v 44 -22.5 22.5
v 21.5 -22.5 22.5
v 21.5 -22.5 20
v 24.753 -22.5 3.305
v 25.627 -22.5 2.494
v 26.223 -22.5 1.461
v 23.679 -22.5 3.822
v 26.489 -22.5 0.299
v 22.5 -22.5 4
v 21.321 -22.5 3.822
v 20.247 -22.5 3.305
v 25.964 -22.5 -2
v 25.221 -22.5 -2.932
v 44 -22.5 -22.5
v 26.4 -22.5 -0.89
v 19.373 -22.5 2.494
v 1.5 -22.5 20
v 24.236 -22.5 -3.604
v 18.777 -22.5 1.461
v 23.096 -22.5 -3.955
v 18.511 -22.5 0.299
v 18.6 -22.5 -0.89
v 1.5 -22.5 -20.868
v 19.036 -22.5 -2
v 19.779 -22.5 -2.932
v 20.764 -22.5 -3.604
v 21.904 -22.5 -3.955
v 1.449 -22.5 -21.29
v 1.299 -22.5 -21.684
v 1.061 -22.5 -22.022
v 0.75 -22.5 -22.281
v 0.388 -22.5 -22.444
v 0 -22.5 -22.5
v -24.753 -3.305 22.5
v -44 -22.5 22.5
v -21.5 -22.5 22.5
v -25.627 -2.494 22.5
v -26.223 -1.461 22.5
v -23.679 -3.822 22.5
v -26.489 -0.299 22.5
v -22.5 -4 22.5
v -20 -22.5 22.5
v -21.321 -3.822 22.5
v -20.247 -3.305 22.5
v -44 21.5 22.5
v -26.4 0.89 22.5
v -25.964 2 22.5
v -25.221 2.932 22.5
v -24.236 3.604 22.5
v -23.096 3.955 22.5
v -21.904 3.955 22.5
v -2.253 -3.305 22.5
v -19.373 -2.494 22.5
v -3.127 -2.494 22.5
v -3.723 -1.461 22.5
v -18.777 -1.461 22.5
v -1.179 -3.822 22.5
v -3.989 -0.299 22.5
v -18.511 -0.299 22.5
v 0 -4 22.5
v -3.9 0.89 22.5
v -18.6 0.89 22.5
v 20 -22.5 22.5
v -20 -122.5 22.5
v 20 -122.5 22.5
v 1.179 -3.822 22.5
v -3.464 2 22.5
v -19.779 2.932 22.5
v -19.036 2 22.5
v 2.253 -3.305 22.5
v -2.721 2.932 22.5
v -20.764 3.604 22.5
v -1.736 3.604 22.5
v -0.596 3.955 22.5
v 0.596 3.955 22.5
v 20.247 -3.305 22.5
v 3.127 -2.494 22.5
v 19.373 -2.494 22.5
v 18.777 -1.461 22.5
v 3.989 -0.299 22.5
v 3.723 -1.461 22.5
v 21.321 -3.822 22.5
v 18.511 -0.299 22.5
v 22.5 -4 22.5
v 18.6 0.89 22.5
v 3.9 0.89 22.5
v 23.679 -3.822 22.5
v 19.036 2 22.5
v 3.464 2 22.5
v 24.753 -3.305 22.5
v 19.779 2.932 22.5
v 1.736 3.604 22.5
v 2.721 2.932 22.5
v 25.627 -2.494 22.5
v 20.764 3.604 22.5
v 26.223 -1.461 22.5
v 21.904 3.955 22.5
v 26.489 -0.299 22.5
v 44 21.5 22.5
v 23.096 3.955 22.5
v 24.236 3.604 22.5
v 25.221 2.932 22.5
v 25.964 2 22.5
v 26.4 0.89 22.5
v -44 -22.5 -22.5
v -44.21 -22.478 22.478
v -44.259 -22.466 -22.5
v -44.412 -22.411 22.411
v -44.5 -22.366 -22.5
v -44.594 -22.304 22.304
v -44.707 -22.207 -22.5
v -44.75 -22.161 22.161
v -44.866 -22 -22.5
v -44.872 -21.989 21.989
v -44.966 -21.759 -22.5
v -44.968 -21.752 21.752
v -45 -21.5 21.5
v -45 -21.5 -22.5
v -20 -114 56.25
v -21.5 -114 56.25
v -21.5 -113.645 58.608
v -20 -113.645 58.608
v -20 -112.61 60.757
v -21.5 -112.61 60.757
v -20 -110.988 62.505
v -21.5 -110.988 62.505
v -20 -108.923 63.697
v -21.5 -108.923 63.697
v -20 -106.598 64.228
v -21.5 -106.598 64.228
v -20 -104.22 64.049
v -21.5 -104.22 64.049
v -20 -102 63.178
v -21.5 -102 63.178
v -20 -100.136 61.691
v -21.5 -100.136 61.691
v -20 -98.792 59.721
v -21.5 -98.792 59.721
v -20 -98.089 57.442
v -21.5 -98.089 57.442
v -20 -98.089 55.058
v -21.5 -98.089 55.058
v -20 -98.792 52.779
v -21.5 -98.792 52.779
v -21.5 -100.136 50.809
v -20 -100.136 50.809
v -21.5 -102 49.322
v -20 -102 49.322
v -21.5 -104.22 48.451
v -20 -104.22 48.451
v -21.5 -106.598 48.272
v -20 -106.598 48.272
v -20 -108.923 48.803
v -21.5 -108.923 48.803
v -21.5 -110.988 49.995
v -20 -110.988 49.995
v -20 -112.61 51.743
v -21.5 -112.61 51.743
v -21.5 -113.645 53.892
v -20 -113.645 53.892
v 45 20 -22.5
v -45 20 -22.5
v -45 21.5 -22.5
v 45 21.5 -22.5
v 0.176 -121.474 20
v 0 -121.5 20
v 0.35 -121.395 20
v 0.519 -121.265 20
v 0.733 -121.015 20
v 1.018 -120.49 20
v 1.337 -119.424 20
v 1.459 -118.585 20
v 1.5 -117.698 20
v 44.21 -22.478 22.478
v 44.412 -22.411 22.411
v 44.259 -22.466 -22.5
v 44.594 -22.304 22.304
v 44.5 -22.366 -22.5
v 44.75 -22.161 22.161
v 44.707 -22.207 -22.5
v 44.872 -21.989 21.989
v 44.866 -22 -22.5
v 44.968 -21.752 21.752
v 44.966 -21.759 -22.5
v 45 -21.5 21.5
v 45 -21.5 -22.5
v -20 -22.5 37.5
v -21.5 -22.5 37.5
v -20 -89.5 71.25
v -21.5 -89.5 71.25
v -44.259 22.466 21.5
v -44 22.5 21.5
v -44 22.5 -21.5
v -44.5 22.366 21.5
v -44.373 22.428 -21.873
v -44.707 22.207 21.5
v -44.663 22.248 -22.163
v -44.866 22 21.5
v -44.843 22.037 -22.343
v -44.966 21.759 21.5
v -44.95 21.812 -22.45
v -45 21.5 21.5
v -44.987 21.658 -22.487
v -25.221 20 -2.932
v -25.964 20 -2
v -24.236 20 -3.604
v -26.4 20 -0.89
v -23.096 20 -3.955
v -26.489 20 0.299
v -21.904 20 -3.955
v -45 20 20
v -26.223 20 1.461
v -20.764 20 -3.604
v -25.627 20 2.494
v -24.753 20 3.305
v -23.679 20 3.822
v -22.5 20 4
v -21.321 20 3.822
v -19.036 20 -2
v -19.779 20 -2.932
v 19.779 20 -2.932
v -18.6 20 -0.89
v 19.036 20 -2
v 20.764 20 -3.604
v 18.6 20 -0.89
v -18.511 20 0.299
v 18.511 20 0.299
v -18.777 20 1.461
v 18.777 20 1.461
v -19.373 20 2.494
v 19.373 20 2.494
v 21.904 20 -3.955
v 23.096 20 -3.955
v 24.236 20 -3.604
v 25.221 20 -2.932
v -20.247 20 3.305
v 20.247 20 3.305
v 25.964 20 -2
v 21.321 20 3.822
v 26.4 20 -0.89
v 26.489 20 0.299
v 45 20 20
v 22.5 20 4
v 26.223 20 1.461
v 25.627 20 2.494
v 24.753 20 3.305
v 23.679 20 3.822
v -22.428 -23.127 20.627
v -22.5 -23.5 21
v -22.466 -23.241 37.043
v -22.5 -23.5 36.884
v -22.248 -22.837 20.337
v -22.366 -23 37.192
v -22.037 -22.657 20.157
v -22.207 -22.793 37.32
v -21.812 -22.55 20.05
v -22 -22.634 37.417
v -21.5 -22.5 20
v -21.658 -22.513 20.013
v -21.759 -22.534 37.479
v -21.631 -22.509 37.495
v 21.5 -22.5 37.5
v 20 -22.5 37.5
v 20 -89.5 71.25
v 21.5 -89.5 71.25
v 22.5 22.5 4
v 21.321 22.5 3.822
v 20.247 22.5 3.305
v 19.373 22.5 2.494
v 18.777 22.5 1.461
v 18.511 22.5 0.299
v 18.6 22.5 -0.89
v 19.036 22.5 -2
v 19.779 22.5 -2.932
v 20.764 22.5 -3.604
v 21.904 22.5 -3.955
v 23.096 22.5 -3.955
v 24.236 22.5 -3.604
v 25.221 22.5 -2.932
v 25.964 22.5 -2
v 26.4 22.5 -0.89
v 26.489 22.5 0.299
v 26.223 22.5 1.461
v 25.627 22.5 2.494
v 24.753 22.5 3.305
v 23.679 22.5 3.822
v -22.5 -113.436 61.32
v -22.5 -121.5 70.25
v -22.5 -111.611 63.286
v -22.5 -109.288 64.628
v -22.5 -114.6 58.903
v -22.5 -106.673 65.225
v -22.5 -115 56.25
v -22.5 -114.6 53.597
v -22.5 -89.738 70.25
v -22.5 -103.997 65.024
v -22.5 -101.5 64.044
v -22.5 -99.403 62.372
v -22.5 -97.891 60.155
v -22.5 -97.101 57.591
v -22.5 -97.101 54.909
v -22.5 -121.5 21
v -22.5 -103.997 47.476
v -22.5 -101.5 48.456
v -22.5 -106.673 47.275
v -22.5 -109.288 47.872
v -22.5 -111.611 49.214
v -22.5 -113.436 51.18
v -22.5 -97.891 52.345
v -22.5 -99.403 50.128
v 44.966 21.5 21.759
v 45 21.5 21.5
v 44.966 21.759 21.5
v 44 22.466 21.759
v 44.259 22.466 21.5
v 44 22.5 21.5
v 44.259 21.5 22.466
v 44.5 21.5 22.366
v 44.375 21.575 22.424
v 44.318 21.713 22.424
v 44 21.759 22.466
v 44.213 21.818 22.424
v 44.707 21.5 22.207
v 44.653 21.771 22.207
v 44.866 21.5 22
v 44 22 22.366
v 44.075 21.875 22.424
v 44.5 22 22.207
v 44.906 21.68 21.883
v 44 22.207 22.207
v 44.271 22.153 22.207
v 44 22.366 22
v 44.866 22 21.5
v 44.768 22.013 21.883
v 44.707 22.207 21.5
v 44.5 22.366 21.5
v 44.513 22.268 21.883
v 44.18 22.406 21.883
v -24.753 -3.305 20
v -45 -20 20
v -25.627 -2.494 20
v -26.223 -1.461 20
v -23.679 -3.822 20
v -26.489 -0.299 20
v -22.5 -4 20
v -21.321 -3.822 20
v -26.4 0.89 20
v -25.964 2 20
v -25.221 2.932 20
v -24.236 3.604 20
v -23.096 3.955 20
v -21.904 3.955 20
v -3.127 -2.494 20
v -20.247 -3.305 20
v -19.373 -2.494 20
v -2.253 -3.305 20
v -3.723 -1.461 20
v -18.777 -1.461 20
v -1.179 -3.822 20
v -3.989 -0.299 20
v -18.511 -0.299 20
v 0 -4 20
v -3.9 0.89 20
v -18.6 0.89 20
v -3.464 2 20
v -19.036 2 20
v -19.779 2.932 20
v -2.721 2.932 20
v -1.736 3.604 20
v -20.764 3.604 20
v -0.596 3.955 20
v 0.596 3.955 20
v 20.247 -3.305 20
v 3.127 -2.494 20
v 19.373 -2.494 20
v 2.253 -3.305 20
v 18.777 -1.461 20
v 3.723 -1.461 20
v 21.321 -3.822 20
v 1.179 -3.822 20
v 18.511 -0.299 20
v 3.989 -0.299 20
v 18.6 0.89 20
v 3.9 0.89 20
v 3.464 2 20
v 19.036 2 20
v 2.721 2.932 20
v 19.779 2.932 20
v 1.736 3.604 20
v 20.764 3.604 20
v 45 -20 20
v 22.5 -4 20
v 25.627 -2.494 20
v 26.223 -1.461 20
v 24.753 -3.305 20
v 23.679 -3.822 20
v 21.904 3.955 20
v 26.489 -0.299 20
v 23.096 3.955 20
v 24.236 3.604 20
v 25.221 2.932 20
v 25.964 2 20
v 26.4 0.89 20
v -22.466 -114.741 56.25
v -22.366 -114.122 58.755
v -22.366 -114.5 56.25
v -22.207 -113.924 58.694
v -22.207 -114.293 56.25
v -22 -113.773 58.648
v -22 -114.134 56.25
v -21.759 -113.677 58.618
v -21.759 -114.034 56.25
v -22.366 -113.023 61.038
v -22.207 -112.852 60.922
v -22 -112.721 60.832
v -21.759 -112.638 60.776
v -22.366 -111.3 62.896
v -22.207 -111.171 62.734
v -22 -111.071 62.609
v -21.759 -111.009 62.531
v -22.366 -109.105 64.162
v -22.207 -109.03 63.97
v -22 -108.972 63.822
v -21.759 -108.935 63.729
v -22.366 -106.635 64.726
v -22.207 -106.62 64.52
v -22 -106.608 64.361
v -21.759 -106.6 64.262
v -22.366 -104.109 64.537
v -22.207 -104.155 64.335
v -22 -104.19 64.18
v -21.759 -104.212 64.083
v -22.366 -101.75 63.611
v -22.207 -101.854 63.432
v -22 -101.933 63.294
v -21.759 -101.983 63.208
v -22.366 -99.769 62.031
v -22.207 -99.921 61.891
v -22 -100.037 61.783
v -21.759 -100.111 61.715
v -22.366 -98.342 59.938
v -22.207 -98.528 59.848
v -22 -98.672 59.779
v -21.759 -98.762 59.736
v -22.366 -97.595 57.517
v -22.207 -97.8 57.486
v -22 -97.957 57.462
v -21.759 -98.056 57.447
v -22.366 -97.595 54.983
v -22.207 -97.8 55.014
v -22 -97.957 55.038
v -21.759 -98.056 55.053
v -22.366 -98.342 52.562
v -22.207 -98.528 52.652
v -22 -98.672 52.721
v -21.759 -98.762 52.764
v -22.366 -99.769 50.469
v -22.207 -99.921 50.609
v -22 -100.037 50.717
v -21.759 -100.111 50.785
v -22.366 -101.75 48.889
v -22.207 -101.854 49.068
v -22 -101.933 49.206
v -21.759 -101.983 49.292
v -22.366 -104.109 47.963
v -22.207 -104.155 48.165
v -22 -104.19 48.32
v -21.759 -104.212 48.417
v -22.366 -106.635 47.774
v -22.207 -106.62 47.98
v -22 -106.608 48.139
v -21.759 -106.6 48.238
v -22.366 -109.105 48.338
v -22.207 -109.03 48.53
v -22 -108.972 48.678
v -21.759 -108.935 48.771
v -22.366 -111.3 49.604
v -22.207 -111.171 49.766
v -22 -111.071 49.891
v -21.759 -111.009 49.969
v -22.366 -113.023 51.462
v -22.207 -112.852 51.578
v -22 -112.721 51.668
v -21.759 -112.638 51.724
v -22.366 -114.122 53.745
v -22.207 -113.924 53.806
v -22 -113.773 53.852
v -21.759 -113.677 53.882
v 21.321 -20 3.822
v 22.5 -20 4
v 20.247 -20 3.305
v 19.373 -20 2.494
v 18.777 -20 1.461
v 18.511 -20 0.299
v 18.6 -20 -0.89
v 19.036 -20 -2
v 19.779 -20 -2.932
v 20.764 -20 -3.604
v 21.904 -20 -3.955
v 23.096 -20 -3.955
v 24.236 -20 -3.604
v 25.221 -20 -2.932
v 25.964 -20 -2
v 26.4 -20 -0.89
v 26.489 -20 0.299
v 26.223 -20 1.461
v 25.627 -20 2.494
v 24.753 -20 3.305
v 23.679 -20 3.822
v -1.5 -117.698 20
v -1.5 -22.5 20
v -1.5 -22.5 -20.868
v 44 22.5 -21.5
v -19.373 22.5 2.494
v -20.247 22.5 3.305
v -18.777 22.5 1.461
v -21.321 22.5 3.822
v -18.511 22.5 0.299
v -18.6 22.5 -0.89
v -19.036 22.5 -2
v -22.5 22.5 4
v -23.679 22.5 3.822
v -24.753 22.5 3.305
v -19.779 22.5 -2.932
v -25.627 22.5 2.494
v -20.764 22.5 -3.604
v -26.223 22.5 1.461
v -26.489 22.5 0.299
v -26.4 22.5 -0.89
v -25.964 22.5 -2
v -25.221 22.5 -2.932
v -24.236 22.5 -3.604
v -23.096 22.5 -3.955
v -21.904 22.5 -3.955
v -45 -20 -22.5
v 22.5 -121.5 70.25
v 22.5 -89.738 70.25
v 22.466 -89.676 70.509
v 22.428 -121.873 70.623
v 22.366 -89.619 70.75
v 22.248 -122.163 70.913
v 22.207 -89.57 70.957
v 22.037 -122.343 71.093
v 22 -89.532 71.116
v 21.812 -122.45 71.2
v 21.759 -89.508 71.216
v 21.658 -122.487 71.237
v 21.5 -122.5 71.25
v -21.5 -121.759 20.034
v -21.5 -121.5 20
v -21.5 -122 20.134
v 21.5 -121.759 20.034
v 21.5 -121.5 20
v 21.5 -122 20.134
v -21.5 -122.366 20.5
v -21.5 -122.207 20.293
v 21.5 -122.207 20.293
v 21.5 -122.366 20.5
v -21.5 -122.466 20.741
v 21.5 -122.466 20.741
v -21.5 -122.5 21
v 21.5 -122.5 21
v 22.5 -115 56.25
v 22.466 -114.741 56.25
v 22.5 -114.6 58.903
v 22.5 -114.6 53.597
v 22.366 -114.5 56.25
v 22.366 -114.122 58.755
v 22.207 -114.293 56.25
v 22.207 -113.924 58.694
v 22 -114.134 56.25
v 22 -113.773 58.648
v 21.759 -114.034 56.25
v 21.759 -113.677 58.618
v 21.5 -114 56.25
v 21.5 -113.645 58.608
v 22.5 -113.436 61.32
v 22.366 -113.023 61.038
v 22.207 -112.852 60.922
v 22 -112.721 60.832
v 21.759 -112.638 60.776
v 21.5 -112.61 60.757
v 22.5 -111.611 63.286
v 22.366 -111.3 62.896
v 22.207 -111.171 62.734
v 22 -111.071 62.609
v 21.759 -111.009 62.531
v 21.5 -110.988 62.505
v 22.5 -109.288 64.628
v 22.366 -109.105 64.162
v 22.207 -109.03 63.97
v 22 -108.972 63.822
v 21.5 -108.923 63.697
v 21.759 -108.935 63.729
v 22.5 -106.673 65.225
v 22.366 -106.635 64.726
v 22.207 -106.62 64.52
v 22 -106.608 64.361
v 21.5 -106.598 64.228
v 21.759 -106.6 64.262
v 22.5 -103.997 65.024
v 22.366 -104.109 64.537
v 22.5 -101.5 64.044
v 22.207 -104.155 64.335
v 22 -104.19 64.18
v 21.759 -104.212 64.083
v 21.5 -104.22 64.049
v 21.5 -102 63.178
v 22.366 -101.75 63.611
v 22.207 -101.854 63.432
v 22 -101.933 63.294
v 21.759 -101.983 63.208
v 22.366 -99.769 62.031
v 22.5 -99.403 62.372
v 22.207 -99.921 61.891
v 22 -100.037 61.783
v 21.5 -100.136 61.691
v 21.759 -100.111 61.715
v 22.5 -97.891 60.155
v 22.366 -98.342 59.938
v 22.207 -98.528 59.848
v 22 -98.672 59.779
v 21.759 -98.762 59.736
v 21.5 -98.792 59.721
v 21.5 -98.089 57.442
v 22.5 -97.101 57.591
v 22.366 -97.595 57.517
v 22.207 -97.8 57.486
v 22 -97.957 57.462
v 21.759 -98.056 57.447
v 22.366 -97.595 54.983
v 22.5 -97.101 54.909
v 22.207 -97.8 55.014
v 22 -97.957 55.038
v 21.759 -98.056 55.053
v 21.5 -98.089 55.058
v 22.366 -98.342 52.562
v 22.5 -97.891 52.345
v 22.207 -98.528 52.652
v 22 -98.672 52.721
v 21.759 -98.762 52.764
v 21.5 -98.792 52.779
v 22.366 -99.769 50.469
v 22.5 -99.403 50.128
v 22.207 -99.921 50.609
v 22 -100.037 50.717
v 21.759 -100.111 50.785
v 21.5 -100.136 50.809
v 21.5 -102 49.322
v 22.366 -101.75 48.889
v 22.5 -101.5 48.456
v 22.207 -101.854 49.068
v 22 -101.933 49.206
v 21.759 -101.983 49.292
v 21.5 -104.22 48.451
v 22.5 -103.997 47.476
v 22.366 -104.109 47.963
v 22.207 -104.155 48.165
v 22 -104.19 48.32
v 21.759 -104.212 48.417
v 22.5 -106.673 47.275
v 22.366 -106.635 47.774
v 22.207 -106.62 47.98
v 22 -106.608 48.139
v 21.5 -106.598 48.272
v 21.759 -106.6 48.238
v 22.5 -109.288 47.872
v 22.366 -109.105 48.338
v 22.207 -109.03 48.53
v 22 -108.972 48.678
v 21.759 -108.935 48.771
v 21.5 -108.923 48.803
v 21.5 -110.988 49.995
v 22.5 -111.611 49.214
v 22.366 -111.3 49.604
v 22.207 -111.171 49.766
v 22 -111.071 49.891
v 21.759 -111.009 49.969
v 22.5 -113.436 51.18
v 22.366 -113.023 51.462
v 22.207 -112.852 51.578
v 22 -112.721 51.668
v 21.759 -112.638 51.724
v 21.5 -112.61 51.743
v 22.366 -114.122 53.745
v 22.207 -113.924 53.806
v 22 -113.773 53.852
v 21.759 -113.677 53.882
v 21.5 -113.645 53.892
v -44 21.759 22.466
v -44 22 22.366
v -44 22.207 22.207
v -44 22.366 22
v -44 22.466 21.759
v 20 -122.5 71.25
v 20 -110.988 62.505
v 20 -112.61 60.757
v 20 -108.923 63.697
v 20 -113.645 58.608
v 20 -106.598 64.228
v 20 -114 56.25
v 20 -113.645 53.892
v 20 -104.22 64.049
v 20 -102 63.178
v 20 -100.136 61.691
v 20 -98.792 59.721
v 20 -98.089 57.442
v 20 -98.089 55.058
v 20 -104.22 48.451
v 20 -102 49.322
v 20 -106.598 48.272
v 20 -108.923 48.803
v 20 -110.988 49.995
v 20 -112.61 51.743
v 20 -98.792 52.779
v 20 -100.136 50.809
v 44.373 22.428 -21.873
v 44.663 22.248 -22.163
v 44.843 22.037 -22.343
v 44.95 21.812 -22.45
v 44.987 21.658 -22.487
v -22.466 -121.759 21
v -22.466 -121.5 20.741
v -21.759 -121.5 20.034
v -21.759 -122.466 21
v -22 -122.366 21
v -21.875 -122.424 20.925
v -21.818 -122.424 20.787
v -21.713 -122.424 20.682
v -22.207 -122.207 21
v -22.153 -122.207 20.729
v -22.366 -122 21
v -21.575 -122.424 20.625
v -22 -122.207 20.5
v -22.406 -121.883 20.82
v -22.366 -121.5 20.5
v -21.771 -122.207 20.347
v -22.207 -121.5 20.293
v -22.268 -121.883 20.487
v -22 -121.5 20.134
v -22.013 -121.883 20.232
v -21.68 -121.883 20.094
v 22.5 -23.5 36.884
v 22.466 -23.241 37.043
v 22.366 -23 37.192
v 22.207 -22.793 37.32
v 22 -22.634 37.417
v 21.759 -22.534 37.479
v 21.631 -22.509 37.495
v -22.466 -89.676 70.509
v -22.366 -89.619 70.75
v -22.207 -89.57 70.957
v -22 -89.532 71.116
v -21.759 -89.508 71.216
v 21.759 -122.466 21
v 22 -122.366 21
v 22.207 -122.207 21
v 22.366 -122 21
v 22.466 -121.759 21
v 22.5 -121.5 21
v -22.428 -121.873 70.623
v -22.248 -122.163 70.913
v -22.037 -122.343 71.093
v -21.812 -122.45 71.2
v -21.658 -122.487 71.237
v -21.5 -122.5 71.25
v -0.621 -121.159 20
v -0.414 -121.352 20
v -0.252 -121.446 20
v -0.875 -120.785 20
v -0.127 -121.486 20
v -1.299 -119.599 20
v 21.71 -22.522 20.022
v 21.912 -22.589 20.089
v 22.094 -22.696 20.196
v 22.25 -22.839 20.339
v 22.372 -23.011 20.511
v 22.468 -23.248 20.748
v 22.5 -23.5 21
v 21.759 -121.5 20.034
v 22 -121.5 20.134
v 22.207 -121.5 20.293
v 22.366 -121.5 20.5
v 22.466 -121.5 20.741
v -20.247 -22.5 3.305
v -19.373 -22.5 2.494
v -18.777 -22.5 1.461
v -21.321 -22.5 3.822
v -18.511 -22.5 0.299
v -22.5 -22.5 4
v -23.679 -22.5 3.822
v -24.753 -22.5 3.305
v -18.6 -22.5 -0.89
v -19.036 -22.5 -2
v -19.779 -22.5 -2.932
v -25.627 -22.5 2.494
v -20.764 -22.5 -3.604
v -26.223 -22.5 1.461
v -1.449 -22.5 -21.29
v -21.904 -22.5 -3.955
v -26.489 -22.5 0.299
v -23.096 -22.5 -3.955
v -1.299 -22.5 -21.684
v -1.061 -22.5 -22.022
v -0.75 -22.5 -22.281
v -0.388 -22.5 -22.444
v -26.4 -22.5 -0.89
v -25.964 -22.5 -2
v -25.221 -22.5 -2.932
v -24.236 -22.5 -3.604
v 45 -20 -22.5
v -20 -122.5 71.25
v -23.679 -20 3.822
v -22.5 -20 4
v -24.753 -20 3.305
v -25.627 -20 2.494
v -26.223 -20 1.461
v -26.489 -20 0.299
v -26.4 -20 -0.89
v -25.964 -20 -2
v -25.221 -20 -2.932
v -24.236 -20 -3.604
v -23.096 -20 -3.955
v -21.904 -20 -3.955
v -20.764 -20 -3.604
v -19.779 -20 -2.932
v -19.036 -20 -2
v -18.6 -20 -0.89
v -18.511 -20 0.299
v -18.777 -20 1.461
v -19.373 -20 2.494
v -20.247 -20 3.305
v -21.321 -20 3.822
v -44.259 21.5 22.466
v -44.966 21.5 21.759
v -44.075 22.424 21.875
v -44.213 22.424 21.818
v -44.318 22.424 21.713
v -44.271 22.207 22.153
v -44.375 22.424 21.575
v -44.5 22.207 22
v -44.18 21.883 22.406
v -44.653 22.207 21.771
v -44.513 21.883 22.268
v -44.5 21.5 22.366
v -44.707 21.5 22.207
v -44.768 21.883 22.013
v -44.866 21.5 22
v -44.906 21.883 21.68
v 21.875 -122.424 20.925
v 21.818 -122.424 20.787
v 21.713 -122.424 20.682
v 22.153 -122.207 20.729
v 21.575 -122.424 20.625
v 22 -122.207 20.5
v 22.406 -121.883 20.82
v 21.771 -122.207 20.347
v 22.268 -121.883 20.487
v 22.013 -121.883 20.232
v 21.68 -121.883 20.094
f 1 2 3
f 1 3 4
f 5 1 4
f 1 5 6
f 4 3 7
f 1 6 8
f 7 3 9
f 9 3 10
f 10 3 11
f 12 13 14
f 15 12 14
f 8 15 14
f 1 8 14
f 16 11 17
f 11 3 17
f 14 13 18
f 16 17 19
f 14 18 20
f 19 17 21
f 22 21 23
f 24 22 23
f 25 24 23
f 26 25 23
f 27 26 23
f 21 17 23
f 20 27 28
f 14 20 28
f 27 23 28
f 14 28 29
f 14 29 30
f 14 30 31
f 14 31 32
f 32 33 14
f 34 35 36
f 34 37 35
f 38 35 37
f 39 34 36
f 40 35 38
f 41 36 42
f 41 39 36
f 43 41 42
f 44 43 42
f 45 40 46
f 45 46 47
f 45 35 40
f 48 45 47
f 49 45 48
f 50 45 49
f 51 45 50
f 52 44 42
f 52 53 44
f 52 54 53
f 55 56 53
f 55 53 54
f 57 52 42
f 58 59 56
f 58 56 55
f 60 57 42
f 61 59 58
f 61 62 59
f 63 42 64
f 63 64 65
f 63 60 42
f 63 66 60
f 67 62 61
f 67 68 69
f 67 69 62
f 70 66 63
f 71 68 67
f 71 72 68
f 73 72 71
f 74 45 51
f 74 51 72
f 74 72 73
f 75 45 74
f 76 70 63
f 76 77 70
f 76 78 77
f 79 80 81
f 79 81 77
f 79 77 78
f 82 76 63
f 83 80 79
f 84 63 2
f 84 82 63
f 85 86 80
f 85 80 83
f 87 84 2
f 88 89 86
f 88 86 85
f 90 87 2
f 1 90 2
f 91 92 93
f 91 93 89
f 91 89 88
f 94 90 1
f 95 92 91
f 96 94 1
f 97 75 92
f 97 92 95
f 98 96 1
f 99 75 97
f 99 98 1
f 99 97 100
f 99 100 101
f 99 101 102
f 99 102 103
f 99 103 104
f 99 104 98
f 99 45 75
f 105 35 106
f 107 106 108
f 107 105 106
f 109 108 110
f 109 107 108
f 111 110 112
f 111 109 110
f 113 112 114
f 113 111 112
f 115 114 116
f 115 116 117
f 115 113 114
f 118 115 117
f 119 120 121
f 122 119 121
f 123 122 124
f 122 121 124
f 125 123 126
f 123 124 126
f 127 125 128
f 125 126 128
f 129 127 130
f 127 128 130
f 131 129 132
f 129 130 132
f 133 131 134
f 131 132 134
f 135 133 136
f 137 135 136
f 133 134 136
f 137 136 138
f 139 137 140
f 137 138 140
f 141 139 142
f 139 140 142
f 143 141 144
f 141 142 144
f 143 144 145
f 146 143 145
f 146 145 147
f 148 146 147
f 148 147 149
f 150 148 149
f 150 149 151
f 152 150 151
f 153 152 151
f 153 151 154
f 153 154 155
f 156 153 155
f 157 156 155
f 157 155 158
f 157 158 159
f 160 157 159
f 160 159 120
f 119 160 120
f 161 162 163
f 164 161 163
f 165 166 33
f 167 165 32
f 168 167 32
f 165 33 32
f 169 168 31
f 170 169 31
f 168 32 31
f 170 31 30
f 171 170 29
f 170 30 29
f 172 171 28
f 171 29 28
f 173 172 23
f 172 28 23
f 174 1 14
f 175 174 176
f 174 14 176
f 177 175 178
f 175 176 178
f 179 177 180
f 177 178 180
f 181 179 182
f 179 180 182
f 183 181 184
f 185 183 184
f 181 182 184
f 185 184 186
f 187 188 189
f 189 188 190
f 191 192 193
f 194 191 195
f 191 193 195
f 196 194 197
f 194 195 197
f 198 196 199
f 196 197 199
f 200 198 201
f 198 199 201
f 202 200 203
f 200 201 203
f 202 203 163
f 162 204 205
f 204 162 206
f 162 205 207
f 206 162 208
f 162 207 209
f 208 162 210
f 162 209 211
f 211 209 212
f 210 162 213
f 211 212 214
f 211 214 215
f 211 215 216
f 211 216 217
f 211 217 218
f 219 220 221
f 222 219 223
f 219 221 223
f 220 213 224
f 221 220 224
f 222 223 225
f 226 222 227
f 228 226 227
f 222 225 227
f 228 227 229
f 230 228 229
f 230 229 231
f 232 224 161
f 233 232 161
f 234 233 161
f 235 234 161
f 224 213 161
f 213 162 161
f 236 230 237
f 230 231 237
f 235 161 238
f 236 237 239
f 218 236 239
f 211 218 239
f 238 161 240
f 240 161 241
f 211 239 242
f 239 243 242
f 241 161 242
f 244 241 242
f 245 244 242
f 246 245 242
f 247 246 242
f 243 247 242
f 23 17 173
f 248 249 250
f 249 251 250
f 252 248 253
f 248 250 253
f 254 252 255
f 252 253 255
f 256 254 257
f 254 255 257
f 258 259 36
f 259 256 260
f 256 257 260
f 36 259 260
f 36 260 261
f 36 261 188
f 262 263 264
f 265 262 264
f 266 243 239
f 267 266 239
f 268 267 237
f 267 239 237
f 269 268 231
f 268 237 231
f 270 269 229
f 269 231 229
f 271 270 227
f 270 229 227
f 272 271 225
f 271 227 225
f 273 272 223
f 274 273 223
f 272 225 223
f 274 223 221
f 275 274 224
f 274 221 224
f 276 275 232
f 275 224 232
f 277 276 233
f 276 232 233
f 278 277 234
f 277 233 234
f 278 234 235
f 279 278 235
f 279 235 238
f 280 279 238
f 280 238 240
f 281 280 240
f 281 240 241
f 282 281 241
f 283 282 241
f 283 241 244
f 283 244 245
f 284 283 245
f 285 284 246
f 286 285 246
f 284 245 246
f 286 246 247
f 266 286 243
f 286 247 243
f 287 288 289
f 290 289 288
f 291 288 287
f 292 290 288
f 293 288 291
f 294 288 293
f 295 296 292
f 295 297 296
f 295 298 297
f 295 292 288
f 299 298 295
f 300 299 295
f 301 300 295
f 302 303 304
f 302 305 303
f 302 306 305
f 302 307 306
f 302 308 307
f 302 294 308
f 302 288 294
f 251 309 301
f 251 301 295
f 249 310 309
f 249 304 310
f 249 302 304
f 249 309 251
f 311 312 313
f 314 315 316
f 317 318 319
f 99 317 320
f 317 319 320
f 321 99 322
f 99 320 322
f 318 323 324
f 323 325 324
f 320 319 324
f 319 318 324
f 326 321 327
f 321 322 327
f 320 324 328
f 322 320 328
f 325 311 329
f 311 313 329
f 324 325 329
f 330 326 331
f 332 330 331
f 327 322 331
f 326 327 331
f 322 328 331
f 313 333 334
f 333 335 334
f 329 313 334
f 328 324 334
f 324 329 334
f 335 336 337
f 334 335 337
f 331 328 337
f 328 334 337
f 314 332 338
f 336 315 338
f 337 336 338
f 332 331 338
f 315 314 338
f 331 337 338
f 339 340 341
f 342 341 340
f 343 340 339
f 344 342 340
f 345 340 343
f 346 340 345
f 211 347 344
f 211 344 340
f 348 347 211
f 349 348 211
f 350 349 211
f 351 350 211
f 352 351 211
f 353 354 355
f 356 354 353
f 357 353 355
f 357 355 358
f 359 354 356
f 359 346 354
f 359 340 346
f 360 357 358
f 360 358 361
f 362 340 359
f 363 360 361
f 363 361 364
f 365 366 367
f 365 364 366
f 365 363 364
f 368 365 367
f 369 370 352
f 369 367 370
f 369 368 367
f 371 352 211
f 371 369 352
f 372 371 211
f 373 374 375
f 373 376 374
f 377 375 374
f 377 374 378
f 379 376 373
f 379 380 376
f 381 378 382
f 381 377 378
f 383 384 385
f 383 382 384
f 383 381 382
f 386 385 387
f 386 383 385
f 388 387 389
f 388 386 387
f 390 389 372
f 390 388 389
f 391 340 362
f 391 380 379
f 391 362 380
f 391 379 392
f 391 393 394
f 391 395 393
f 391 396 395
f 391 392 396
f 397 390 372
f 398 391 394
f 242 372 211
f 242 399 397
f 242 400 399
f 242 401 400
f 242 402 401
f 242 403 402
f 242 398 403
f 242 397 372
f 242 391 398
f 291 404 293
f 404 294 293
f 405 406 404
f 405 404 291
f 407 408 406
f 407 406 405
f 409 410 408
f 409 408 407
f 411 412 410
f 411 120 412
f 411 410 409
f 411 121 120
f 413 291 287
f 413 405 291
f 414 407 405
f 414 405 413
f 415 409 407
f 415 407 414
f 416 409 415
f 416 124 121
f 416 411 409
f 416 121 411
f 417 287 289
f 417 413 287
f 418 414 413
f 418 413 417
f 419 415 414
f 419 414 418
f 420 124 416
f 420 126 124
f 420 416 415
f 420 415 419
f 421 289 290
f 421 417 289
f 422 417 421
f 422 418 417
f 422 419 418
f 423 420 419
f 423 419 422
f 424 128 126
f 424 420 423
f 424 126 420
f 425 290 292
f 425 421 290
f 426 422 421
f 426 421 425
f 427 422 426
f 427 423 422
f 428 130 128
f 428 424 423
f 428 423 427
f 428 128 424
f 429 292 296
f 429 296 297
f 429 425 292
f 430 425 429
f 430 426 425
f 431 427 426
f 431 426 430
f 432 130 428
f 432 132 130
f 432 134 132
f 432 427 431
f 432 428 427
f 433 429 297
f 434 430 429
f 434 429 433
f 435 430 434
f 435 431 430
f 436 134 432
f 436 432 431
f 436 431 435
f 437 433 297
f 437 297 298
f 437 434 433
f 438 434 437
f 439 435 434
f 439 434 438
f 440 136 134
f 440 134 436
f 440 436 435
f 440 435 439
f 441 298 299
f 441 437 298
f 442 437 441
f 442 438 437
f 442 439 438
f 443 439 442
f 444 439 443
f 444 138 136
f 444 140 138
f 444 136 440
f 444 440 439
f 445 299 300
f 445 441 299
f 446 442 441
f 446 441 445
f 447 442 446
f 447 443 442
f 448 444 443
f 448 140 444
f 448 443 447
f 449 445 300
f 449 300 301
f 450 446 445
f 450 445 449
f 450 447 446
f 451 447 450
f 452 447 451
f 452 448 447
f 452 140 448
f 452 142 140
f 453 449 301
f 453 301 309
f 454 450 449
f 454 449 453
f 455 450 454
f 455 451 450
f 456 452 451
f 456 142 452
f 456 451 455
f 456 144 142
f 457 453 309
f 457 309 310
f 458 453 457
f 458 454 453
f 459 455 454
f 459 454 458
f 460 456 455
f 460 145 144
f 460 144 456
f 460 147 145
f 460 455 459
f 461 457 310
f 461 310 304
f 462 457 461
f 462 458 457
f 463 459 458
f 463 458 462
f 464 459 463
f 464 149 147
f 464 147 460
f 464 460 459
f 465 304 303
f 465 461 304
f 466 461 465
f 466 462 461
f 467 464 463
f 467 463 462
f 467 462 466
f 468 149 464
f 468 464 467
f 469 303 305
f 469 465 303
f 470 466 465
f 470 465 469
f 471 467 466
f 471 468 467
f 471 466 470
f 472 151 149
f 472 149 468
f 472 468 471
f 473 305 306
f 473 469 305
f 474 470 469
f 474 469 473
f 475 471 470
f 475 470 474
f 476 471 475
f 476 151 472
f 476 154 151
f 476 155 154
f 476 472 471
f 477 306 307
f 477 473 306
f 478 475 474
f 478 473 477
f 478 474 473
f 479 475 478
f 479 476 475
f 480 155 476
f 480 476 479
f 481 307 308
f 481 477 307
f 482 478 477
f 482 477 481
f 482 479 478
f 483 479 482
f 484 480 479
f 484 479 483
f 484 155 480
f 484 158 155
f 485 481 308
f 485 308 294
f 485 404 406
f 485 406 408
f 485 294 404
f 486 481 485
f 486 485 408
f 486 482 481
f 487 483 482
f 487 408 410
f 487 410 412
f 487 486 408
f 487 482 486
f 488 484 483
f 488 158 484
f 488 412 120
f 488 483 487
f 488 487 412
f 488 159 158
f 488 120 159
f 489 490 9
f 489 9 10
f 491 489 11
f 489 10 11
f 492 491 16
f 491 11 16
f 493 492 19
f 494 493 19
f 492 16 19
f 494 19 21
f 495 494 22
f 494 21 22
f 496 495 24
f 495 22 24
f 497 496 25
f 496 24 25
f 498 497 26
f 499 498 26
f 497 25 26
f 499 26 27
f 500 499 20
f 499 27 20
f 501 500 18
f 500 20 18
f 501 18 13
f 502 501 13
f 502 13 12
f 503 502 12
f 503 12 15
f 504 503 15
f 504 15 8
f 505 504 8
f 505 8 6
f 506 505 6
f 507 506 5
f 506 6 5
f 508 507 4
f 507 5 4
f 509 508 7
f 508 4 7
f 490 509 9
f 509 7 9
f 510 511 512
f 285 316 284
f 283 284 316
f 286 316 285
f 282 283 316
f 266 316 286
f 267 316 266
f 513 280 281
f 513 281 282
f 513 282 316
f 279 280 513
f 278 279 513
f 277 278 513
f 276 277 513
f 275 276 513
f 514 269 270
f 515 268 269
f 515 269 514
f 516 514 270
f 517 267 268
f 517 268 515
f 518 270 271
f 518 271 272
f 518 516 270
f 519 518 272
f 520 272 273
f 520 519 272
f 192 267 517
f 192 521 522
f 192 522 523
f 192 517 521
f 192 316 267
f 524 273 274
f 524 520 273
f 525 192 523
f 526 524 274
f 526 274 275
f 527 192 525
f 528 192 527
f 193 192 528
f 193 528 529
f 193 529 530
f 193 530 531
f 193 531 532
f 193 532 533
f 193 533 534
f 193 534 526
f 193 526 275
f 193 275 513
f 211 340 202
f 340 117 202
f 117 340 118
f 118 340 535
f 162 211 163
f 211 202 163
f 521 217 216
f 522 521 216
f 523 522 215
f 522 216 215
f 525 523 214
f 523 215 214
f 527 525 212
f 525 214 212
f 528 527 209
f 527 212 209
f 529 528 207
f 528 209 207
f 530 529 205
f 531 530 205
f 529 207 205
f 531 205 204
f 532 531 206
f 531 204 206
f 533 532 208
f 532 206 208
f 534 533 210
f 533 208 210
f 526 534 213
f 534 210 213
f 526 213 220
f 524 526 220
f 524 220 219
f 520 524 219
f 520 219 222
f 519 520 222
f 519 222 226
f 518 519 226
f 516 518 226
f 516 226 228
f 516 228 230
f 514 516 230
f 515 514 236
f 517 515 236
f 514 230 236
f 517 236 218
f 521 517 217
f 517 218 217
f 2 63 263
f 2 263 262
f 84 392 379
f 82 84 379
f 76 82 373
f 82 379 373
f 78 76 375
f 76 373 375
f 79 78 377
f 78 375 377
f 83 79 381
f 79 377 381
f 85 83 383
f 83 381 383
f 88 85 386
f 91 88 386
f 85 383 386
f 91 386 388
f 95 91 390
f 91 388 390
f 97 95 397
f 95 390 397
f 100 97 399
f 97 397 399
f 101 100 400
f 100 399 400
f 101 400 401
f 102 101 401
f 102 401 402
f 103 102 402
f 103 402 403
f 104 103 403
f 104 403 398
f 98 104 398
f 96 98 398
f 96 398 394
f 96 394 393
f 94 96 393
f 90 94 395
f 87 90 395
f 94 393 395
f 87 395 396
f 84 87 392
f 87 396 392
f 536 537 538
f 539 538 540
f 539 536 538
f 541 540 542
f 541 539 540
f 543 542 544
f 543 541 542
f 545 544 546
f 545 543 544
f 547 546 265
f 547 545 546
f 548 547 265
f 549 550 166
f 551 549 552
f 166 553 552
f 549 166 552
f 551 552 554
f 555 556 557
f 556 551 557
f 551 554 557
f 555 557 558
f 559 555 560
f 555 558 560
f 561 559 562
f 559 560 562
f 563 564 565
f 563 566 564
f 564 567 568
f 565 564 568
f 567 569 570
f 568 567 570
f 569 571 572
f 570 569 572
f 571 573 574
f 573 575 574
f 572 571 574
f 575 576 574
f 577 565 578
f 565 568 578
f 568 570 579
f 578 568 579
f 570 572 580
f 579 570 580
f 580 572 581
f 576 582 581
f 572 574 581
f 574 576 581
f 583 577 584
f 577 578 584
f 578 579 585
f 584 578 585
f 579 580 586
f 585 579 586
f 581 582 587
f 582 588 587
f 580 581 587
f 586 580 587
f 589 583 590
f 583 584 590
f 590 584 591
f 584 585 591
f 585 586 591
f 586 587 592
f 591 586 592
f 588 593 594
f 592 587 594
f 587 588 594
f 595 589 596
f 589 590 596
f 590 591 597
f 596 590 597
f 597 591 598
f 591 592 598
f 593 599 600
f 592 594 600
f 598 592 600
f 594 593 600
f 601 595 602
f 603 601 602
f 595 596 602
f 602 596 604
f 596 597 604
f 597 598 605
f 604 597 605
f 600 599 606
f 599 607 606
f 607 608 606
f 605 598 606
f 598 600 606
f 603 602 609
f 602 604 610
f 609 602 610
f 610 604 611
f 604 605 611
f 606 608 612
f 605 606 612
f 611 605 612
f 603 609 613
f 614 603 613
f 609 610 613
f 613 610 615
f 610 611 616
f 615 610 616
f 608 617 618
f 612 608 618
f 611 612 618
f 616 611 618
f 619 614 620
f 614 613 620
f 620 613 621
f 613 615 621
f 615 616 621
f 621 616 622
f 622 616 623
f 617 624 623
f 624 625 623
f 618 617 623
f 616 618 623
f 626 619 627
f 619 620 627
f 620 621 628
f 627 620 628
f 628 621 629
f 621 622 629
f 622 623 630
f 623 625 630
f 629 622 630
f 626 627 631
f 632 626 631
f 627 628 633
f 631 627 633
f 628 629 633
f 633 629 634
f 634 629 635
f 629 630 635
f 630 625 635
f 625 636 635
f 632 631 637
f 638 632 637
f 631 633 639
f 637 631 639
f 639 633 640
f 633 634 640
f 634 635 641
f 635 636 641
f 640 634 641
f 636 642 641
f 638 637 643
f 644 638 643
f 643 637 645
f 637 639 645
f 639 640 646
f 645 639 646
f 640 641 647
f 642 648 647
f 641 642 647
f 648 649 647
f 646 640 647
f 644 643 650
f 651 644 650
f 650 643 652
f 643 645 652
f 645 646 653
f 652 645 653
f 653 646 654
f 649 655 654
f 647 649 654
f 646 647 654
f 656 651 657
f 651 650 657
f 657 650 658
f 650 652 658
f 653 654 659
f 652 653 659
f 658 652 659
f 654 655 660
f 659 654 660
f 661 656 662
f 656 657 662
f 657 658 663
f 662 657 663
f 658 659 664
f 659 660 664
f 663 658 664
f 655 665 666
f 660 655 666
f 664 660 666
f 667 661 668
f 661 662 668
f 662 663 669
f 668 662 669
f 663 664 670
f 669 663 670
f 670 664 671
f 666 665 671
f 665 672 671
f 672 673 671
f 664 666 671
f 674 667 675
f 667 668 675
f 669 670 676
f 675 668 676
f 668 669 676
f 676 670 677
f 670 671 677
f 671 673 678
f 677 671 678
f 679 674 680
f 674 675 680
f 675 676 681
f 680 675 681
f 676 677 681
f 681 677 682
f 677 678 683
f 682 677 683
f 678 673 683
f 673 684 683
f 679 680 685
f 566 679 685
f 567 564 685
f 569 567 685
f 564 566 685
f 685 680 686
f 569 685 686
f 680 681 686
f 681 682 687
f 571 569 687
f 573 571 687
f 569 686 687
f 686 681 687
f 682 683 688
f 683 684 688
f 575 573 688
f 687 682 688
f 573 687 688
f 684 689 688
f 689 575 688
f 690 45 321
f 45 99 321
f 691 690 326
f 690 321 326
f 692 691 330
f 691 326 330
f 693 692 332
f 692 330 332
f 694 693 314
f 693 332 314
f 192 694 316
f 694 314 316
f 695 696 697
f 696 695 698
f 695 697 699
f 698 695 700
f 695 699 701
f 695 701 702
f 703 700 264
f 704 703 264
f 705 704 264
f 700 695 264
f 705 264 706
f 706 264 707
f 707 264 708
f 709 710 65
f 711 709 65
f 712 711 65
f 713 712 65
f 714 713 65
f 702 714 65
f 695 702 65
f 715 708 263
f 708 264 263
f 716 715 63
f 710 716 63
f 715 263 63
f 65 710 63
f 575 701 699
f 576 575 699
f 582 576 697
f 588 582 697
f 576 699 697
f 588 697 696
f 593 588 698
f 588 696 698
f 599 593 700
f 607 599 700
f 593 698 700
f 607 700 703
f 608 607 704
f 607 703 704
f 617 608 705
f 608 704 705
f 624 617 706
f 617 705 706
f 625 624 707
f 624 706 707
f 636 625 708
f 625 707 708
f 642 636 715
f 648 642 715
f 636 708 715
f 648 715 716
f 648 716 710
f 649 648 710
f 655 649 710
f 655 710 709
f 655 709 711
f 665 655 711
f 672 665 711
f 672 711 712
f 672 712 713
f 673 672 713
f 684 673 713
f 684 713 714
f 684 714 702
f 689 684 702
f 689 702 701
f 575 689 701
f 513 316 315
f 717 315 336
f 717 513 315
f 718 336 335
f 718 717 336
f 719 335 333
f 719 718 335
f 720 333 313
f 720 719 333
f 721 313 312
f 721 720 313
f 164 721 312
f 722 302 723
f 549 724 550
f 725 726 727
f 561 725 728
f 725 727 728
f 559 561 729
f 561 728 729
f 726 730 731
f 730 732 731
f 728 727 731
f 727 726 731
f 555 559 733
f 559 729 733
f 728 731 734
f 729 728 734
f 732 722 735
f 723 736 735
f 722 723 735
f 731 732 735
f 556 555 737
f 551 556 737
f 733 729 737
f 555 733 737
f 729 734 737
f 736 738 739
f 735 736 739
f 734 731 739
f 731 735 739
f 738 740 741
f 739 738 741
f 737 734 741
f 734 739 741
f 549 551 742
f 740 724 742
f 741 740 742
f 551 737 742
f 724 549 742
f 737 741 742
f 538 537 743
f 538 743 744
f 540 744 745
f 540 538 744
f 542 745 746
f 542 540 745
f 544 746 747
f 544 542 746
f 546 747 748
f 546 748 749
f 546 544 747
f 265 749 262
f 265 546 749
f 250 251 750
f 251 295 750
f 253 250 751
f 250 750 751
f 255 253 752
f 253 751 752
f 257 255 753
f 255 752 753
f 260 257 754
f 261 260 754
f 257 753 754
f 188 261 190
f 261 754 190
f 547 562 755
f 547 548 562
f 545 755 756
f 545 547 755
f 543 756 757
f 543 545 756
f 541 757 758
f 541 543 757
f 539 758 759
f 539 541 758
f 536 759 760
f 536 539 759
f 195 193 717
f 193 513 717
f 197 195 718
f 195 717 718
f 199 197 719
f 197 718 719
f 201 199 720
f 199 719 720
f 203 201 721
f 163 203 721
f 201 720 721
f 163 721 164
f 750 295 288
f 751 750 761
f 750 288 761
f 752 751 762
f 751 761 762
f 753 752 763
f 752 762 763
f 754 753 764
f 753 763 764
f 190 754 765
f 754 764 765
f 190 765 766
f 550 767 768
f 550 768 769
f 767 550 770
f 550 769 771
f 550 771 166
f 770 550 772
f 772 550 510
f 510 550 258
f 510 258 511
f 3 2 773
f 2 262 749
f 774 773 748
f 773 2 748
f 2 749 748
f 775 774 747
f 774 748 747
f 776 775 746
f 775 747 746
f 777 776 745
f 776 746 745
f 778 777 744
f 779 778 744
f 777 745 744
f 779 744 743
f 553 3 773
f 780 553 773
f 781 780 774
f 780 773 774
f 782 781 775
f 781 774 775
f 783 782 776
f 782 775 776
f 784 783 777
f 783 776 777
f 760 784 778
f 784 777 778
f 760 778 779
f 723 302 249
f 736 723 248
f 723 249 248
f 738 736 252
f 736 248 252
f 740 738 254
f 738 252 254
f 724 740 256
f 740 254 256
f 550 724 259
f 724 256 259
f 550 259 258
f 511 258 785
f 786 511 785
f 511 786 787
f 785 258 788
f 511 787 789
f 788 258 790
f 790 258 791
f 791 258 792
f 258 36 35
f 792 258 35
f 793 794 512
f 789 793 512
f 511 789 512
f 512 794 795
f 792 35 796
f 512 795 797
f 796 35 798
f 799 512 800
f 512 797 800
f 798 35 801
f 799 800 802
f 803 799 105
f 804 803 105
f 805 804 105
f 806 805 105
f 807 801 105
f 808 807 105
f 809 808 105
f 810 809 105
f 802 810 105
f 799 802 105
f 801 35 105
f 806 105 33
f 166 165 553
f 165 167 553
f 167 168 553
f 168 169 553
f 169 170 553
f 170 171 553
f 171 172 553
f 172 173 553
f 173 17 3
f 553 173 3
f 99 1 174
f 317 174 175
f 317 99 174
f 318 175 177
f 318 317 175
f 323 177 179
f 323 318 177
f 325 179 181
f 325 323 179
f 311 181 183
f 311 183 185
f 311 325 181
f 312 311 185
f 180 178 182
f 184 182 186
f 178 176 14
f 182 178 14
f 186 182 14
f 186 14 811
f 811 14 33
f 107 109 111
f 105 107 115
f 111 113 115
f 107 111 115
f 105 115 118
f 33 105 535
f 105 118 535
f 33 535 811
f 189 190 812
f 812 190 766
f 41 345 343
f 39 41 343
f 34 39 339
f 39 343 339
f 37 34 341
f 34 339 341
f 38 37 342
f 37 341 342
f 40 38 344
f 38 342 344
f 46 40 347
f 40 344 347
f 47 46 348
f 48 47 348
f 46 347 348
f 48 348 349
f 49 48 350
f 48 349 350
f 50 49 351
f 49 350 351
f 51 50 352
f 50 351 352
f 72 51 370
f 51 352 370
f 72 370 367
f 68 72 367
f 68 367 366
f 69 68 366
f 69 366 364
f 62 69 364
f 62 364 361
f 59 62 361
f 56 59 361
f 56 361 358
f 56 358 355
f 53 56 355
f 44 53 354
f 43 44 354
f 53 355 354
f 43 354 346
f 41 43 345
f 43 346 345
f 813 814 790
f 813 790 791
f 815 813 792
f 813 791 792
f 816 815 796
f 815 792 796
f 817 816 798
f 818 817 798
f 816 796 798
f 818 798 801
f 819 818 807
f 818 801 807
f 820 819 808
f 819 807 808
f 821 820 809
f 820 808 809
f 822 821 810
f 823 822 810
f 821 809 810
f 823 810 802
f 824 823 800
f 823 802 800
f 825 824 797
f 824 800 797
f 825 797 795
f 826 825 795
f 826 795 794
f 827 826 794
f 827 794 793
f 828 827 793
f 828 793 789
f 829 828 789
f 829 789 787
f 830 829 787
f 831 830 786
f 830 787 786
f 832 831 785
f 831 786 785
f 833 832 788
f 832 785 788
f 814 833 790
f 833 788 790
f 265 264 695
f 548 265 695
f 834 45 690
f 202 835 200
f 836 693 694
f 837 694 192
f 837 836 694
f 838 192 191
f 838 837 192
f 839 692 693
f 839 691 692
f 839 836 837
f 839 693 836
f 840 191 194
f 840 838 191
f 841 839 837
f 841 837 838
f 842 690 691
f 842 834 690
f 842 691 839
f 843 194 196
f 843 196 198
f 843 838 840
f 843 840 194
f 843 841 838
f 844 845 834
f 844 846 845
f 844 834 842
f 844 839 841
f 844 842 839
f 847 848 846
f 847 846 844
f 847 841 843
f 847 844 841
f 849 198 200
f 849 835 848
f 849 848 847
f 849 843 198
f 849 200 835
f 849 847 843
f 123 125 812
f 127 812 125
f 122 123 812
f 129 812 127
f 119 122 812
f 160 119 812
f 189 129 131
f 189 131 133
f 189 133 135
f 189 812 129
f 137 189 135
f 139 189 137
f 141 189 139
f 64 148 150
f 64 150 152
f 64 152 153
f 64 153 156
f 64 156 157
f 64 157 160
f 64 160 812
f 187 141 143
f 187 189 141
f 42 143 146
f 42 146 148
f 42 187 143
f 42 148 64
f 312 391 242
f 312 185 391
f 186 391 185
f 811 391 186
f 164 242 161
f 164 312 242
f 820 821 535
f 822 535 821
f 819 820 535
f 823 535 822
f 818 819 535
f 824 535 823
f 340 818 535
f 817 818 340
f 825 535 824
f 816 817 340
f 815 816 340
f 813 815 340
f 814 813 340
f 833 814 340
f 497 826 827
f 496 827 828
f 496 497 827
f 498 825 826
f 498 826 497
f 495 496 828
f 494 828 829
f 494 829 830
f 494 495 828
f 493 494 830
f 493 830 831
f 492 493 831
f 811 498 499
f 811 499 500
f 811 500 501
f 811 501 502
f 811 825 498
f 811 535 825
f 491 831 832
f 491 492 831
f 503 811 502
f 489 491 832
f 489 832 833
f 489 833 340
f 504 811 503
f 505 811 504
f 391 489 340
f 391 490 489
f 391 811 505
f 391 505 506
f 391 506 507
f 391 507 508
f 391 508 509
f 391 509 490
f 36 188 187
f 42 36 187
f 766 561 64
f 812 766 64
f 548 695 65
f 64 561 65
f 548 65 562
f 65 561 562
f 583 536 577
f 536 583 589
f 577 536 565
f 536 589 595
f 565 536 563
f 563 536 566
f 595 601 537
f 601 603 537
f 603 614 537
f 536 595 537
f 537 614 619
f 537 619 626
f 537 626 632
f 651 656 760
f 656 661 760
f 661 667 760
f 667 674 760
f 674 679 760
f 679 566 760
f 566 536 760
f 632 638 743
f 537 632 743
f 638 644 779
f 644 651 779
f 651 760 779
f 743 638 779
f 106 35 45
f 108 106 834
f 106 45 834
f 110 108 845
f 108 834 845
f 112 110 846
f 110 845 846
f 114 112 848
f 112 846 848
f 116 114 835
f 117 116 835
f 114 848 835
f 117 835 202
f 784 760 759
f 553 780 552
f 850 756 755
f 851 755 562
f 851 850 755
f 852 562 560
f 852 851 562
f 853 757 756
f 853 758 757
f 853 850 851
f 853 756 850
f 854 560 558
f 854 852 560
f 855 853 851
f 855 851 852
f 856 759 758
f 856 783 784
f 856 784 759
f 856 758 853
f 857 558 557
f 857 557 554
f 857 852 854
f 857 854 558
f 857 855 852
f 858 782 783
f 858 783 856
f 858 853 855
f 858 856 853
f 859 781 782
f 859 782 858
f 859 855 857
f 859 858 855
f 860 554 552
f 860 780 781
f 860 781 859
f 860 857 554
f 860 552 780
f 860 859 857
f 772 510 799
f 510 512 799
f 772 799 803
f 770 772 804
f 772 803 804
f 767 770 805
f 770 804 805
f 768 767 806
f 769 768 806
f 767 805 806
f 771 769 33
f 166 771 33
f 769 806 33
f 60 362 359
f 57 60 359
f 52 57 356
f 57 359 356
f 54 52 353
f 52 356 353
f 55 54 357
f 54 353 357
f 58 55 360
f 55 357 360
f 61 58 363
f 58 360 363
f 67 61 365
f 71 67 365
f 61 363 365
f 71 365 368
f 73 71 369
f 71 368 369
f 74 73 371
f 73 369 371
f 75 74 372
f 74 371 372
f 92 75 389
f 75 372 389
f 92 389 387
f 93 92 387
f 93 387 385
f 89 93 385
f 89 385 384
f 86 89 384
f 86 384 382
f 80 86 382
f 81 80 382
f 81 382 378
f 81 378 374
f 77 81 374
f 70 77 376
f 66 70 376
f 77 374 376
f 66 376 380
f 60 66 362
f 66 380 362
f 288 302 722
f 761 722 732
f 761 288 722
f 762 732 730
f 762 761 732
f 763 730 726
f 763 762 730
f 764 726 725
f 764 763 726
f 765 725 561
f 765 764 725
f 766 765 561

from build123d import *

# Parameters (mm, degrees)
DODANIE_WYCI_GNI_CIE1_DEPTH         = 45
DODANIE_WYCI_GNI_CIE1_DEPTH_BACK    = 45
SZKIC1_W                            = 45
SZKIC1_H                            = 45
WYTNIJ_WYCI_GNI_CIE1_DEPTH          = 96.45941546
WYTNIJ_WYCI_GNI_CIE1_DEPTH_BACK     = 96.45941546
SZKIC2_W                            = 42.5
SZKIC2_H                            = 40
DODANIE_WYCI_GNI_CIE2_DEPTH         = 70
DODANIE_WYCI_GNI_CIE2_DEPTH_BACK    = 2.5
SZKIC3_W                            = 45
SZKIC3_H                            = 100
SZKIC4_W                            = 40
SZKIC4_H                            = 70
WYTNIJ_WYCI_GNI_CIE2_DEPTH          = 144.461667354
SZKIC5_R                            = 8
WYTNIJ_WYCI_GNI_CIE4_DEPTH          = 90
ZAOKR_GLENIE2_R                     = 1
ZAOKR_GLENIE3_R                     = 1
SZKIC9_W                            = 4
SZKIC9_H                            = 45
OTWORY_USTALAJ_CE_8_0MM1_AT_2_COUNT = 2
OTWORY_USTALAJ_CE_8_0MM1_AT_2_PITCH = 22.5
OTWORY_USTALAJ_CE_8_0MM1_AT_3_COUNT = 2
OTWORY_USTALAJ_CE_8_0MM1_AT_3_PITCH = 45
SZKIC13_W                           = 4
SZKIC13_H                           = 145
OTWORY_USTALAJ_CE_8_0MM3_AT_2_COUNT = 2
OTWORY_USTALAJ_CE_8_0MM3_AT_2_PITCH = 45
DODANIE_WYCI_GNI_CIE3_DEPTH         = 1.5
DODANIE_WYCI_GNI_CIE3_DEPTH_BACK    = 1.5
ZAOKR_GLENIE4_R                     = 1.5


with BuildPart() as part:
    # Szkic1 → Dodanie-wyciągnięcie1 (new, two sides: drawn at the far end of the back side and taken through both)
    with BuildSketch(Plane(origin=(0, 0, 0), x_dir=(0, 0, -1), z_dir=(1, 0, 0)).offset(-DODANIE_WYCI_GNI_CIE1_DEPTH_BACK)):
        Rectangle(SZKIC1_W, SZKIC1_H)
    extrude(amount=DODANIE_WYCI_GNI_CIE1_DEPTH + DODANIE_WYCI_GNI_CIE1_DEPTH_BACK)

    # Szkic2 → Wytnij-wyciągnięcie1 (cut, two sides: drawn at the far end of the back side and taken through both)
    with BuildSketch(Plane.ZY.offset(45).offset(-WYTNIJ_WYCI_GNI_CIE1_DEPTH_BACK)):
        with Locations((-1.25, 0)):
            Rectangle(SZKIC2_W, SZKIC2_H)
    extrude(amount=WYTNIJ_WYCI_GNI_CIE1_DEPTH + WYTNIJ_WYCI_GNI_CIE1_DEPTH_BACK, mode=Mode.SUBTRACT)

    # Zaokrąglenie2
    zaokr_glenie2_edges = [part.edges().sort_by_distance(p)[0] for p in [
        (-45, 0, 22.5),
        (45, 22.5, 0),
        (45, 0, 22.5),
        (45, -22.5, 0),
        (-45, -22.5, 0),
        (0, 22.5, 22.5),
        (0, 22.5, -22.5),
        (-45, 22.5, 0),
    ]]
    fillet(zaokr_glenie2_edges, radius=ZAOKR_GLENIE2_R)

    # Szkic9 → Otwory ustalające Ø8.0mm1 (revolve, cut)
    with BuildSketch(Plane(origin=(-22.5, 0, 22.5), x_dir=(0, -1, 0), z_dir=(1, 0, 0))):
        with Locations((2, 22.5)):
            Rectangle(SZKIC9_W, SZKIC9_H)
    otwory_ustalaj_ce_8_0mm1 = revolve(axis=Axis((-22.5, 0, 28.85), (0, 0, -1)), mode=Mode.SUBTRACT)

    # Otwory ustalające Ø8.0mm1 at 2: Otwory ustalające Ø8.0mm1 ×2
    with Locations(*[(i * OTWORY_USTALAJ_CE_8_0MM1_AT_2_PITCH, 0, 0) for i in range(1, OTWORY_USTALAJ_CE_8_0MM1_AT_2_COUNT)]):
        add(otwory_ustalaj_ce_8_0mm1, mode=Mode.SUBTRACT)

    # Otwory ustalające Ø8.0mm1 at 3: Otwory ustalające Ø8.0mm1 ×2
    with Locations(*[(i * OTWORY_USTALAJ_CE_8_0MM1_AT_3_PITCH, 0, 0) for i in range(1, OTWORY_USTALAJ_CE_8_0MM1_AT_3_COUNT)]):
        add(otwory_ustalaj_ce_8_0mm1, mode=Mode.SUBTRACT)

    # Szkic13 → Otwory ustalające Ø8.0mm3 (revolve, cut)
    with BuildSketch(Plane(origin=(22.5, 22.5, 0), x_dir=(0, 0, 1), z_dir=(1, 0, 0))):
        with Locations((2, 72.5)):
            Rectangle(SZKIC13_W, SZKIC13_H)
    otwory_ustalaj_ce_8_0mm3 = revolve(axis=Axis((22.5, 28.85, 0), (0, -1, 0)), mode=Mode.SUBTRACT)

    # Otwory ustalające Ø8.0mm3 at 2: Otwory ustalające Ø8.0mm3 ×2
    with Locations(*[(-i * OTWORY_USTALAJ_CE_8_0MM3_AT_2_PITCH, 0, 0) for i in range(1, OTWORY_USTALAJ_CE_8_0MM3_AT_2_COUNT)]):
        add(otwory_ustalaj_ce_8_0mm3, mode=Mode.SUBTRACT)



with BuildPart() as body_2:
    # Szkic3 → Dodanie-wyciągnięcie2 (new, two sides: drawn at the far end of the back side and taken through both)
    with BuildSketch(Plane.XY.offset(22.5).offset(-DODANIE_WYCI_GNI_CIE2_DEPTH_BACK)):
        with Locations((0, -72.5)):
            Rectangle(SZKIC3_W, SZKIC3_H)
    extrude(amount=DODANIE_WYCI_GNI_CIE2_DEPTH + DODANIE_WYCI_GNI_CIE2_DEPTH_BACK)

    # Szkic4 → Wytnij-wyciągnięcie2 (cut, through all)
    with BuildSketch(Plane(origin=(0, -22.5, 0), x_dir=(1, 0, 0), z_dir=(0, 1, 0))):
        with Locations((0, -57.5)):
            Rectangle(SZKIC4_W, SZKIC4_H)
    extrude(amount=-WYTNIJ_WYCI_GNI_CIE2_DEPTH, mode=Mode.SUBTRACT)

    # Szkic5 → Wytnij-wyciągnięcie4 (cut)
    with BuildSketch(Plane.ZY.offset(22.5)):
        Polygon((71.25, -89.5), (71.25, -122.5), (92.5, -122.5), (92.5, -22.5), (37.5, -22.5), align=None)
        with Locations(Location((56.25, -106, 0), (0, 0, 270))):
            Circle(SZKIC5_R)
    extrude(amount=-WYTNIJ_WYCI_GNI_CIE4_DEPTH, mode=Mode.SUBTRACT)

    # Zaokrąglenie3
    zaokr_glenie3_edges = [body_2.edges().sort_by_distance(p)[0] for p in [
        (22.5, -72.5, 20),
        (22.5, -98, 56.25),
        (-22.5, -98, 56.25),
        (-22.5, -72.5, 20),
        (-22.5, -56, 54.375),
        (22.5, -56, 54.375),
        (-22.5, -106, 71.25),
        (22.5, -106, 71.25),
        (-22.5, -22.5, 28.75),
        (22.5, -22.5, 28.75),
        (22.5, -122.5, 45.625),
        (-22.5, -122.5, 45.625),
        (0, -122.5, 20),
    ]]
    fillet(zaokr_glenie3_edges, radius=ZAOKR_GLENIE3_R)


with BuildPart() as part_1:
    add(part.part)

    add(body_2.part)  # Dodanie-wyciągnięcie3 merges body 2
    # Szkic14 → Dodanie-wyciągnięcie3 (add, two sides: drawn at the far end of the back side and taken through both)
    with BuildSketch(Plane.ZY.offset(-DODANIE_WYCI_GNI_CIE3_DEPTH_BACK)):
        Polygon((20, -121.5), (-22.5, -22.5), (20, -22.5), align=None)
    extrude(amount=DODANIE_WYCI_GNI_CIE3_DEPTH + DODANIE_WYCI_GNI_CIE3_DEPTH_BACK)

    # Zaokrąglenie4
    zaokr_glenie4_edges = [part_1.edges().sort_by_distance(p)[0] for p in [
        (1.5, -72, -1.25),
        (-1.5, -72, -1.25),
    ]]
    fillet(zaokr_glenie4_edges, radius=ZAOKR_GLENIE4_R - 0.0001)  # a hair under: the kernel refuses the full size


solid = part_1.part
